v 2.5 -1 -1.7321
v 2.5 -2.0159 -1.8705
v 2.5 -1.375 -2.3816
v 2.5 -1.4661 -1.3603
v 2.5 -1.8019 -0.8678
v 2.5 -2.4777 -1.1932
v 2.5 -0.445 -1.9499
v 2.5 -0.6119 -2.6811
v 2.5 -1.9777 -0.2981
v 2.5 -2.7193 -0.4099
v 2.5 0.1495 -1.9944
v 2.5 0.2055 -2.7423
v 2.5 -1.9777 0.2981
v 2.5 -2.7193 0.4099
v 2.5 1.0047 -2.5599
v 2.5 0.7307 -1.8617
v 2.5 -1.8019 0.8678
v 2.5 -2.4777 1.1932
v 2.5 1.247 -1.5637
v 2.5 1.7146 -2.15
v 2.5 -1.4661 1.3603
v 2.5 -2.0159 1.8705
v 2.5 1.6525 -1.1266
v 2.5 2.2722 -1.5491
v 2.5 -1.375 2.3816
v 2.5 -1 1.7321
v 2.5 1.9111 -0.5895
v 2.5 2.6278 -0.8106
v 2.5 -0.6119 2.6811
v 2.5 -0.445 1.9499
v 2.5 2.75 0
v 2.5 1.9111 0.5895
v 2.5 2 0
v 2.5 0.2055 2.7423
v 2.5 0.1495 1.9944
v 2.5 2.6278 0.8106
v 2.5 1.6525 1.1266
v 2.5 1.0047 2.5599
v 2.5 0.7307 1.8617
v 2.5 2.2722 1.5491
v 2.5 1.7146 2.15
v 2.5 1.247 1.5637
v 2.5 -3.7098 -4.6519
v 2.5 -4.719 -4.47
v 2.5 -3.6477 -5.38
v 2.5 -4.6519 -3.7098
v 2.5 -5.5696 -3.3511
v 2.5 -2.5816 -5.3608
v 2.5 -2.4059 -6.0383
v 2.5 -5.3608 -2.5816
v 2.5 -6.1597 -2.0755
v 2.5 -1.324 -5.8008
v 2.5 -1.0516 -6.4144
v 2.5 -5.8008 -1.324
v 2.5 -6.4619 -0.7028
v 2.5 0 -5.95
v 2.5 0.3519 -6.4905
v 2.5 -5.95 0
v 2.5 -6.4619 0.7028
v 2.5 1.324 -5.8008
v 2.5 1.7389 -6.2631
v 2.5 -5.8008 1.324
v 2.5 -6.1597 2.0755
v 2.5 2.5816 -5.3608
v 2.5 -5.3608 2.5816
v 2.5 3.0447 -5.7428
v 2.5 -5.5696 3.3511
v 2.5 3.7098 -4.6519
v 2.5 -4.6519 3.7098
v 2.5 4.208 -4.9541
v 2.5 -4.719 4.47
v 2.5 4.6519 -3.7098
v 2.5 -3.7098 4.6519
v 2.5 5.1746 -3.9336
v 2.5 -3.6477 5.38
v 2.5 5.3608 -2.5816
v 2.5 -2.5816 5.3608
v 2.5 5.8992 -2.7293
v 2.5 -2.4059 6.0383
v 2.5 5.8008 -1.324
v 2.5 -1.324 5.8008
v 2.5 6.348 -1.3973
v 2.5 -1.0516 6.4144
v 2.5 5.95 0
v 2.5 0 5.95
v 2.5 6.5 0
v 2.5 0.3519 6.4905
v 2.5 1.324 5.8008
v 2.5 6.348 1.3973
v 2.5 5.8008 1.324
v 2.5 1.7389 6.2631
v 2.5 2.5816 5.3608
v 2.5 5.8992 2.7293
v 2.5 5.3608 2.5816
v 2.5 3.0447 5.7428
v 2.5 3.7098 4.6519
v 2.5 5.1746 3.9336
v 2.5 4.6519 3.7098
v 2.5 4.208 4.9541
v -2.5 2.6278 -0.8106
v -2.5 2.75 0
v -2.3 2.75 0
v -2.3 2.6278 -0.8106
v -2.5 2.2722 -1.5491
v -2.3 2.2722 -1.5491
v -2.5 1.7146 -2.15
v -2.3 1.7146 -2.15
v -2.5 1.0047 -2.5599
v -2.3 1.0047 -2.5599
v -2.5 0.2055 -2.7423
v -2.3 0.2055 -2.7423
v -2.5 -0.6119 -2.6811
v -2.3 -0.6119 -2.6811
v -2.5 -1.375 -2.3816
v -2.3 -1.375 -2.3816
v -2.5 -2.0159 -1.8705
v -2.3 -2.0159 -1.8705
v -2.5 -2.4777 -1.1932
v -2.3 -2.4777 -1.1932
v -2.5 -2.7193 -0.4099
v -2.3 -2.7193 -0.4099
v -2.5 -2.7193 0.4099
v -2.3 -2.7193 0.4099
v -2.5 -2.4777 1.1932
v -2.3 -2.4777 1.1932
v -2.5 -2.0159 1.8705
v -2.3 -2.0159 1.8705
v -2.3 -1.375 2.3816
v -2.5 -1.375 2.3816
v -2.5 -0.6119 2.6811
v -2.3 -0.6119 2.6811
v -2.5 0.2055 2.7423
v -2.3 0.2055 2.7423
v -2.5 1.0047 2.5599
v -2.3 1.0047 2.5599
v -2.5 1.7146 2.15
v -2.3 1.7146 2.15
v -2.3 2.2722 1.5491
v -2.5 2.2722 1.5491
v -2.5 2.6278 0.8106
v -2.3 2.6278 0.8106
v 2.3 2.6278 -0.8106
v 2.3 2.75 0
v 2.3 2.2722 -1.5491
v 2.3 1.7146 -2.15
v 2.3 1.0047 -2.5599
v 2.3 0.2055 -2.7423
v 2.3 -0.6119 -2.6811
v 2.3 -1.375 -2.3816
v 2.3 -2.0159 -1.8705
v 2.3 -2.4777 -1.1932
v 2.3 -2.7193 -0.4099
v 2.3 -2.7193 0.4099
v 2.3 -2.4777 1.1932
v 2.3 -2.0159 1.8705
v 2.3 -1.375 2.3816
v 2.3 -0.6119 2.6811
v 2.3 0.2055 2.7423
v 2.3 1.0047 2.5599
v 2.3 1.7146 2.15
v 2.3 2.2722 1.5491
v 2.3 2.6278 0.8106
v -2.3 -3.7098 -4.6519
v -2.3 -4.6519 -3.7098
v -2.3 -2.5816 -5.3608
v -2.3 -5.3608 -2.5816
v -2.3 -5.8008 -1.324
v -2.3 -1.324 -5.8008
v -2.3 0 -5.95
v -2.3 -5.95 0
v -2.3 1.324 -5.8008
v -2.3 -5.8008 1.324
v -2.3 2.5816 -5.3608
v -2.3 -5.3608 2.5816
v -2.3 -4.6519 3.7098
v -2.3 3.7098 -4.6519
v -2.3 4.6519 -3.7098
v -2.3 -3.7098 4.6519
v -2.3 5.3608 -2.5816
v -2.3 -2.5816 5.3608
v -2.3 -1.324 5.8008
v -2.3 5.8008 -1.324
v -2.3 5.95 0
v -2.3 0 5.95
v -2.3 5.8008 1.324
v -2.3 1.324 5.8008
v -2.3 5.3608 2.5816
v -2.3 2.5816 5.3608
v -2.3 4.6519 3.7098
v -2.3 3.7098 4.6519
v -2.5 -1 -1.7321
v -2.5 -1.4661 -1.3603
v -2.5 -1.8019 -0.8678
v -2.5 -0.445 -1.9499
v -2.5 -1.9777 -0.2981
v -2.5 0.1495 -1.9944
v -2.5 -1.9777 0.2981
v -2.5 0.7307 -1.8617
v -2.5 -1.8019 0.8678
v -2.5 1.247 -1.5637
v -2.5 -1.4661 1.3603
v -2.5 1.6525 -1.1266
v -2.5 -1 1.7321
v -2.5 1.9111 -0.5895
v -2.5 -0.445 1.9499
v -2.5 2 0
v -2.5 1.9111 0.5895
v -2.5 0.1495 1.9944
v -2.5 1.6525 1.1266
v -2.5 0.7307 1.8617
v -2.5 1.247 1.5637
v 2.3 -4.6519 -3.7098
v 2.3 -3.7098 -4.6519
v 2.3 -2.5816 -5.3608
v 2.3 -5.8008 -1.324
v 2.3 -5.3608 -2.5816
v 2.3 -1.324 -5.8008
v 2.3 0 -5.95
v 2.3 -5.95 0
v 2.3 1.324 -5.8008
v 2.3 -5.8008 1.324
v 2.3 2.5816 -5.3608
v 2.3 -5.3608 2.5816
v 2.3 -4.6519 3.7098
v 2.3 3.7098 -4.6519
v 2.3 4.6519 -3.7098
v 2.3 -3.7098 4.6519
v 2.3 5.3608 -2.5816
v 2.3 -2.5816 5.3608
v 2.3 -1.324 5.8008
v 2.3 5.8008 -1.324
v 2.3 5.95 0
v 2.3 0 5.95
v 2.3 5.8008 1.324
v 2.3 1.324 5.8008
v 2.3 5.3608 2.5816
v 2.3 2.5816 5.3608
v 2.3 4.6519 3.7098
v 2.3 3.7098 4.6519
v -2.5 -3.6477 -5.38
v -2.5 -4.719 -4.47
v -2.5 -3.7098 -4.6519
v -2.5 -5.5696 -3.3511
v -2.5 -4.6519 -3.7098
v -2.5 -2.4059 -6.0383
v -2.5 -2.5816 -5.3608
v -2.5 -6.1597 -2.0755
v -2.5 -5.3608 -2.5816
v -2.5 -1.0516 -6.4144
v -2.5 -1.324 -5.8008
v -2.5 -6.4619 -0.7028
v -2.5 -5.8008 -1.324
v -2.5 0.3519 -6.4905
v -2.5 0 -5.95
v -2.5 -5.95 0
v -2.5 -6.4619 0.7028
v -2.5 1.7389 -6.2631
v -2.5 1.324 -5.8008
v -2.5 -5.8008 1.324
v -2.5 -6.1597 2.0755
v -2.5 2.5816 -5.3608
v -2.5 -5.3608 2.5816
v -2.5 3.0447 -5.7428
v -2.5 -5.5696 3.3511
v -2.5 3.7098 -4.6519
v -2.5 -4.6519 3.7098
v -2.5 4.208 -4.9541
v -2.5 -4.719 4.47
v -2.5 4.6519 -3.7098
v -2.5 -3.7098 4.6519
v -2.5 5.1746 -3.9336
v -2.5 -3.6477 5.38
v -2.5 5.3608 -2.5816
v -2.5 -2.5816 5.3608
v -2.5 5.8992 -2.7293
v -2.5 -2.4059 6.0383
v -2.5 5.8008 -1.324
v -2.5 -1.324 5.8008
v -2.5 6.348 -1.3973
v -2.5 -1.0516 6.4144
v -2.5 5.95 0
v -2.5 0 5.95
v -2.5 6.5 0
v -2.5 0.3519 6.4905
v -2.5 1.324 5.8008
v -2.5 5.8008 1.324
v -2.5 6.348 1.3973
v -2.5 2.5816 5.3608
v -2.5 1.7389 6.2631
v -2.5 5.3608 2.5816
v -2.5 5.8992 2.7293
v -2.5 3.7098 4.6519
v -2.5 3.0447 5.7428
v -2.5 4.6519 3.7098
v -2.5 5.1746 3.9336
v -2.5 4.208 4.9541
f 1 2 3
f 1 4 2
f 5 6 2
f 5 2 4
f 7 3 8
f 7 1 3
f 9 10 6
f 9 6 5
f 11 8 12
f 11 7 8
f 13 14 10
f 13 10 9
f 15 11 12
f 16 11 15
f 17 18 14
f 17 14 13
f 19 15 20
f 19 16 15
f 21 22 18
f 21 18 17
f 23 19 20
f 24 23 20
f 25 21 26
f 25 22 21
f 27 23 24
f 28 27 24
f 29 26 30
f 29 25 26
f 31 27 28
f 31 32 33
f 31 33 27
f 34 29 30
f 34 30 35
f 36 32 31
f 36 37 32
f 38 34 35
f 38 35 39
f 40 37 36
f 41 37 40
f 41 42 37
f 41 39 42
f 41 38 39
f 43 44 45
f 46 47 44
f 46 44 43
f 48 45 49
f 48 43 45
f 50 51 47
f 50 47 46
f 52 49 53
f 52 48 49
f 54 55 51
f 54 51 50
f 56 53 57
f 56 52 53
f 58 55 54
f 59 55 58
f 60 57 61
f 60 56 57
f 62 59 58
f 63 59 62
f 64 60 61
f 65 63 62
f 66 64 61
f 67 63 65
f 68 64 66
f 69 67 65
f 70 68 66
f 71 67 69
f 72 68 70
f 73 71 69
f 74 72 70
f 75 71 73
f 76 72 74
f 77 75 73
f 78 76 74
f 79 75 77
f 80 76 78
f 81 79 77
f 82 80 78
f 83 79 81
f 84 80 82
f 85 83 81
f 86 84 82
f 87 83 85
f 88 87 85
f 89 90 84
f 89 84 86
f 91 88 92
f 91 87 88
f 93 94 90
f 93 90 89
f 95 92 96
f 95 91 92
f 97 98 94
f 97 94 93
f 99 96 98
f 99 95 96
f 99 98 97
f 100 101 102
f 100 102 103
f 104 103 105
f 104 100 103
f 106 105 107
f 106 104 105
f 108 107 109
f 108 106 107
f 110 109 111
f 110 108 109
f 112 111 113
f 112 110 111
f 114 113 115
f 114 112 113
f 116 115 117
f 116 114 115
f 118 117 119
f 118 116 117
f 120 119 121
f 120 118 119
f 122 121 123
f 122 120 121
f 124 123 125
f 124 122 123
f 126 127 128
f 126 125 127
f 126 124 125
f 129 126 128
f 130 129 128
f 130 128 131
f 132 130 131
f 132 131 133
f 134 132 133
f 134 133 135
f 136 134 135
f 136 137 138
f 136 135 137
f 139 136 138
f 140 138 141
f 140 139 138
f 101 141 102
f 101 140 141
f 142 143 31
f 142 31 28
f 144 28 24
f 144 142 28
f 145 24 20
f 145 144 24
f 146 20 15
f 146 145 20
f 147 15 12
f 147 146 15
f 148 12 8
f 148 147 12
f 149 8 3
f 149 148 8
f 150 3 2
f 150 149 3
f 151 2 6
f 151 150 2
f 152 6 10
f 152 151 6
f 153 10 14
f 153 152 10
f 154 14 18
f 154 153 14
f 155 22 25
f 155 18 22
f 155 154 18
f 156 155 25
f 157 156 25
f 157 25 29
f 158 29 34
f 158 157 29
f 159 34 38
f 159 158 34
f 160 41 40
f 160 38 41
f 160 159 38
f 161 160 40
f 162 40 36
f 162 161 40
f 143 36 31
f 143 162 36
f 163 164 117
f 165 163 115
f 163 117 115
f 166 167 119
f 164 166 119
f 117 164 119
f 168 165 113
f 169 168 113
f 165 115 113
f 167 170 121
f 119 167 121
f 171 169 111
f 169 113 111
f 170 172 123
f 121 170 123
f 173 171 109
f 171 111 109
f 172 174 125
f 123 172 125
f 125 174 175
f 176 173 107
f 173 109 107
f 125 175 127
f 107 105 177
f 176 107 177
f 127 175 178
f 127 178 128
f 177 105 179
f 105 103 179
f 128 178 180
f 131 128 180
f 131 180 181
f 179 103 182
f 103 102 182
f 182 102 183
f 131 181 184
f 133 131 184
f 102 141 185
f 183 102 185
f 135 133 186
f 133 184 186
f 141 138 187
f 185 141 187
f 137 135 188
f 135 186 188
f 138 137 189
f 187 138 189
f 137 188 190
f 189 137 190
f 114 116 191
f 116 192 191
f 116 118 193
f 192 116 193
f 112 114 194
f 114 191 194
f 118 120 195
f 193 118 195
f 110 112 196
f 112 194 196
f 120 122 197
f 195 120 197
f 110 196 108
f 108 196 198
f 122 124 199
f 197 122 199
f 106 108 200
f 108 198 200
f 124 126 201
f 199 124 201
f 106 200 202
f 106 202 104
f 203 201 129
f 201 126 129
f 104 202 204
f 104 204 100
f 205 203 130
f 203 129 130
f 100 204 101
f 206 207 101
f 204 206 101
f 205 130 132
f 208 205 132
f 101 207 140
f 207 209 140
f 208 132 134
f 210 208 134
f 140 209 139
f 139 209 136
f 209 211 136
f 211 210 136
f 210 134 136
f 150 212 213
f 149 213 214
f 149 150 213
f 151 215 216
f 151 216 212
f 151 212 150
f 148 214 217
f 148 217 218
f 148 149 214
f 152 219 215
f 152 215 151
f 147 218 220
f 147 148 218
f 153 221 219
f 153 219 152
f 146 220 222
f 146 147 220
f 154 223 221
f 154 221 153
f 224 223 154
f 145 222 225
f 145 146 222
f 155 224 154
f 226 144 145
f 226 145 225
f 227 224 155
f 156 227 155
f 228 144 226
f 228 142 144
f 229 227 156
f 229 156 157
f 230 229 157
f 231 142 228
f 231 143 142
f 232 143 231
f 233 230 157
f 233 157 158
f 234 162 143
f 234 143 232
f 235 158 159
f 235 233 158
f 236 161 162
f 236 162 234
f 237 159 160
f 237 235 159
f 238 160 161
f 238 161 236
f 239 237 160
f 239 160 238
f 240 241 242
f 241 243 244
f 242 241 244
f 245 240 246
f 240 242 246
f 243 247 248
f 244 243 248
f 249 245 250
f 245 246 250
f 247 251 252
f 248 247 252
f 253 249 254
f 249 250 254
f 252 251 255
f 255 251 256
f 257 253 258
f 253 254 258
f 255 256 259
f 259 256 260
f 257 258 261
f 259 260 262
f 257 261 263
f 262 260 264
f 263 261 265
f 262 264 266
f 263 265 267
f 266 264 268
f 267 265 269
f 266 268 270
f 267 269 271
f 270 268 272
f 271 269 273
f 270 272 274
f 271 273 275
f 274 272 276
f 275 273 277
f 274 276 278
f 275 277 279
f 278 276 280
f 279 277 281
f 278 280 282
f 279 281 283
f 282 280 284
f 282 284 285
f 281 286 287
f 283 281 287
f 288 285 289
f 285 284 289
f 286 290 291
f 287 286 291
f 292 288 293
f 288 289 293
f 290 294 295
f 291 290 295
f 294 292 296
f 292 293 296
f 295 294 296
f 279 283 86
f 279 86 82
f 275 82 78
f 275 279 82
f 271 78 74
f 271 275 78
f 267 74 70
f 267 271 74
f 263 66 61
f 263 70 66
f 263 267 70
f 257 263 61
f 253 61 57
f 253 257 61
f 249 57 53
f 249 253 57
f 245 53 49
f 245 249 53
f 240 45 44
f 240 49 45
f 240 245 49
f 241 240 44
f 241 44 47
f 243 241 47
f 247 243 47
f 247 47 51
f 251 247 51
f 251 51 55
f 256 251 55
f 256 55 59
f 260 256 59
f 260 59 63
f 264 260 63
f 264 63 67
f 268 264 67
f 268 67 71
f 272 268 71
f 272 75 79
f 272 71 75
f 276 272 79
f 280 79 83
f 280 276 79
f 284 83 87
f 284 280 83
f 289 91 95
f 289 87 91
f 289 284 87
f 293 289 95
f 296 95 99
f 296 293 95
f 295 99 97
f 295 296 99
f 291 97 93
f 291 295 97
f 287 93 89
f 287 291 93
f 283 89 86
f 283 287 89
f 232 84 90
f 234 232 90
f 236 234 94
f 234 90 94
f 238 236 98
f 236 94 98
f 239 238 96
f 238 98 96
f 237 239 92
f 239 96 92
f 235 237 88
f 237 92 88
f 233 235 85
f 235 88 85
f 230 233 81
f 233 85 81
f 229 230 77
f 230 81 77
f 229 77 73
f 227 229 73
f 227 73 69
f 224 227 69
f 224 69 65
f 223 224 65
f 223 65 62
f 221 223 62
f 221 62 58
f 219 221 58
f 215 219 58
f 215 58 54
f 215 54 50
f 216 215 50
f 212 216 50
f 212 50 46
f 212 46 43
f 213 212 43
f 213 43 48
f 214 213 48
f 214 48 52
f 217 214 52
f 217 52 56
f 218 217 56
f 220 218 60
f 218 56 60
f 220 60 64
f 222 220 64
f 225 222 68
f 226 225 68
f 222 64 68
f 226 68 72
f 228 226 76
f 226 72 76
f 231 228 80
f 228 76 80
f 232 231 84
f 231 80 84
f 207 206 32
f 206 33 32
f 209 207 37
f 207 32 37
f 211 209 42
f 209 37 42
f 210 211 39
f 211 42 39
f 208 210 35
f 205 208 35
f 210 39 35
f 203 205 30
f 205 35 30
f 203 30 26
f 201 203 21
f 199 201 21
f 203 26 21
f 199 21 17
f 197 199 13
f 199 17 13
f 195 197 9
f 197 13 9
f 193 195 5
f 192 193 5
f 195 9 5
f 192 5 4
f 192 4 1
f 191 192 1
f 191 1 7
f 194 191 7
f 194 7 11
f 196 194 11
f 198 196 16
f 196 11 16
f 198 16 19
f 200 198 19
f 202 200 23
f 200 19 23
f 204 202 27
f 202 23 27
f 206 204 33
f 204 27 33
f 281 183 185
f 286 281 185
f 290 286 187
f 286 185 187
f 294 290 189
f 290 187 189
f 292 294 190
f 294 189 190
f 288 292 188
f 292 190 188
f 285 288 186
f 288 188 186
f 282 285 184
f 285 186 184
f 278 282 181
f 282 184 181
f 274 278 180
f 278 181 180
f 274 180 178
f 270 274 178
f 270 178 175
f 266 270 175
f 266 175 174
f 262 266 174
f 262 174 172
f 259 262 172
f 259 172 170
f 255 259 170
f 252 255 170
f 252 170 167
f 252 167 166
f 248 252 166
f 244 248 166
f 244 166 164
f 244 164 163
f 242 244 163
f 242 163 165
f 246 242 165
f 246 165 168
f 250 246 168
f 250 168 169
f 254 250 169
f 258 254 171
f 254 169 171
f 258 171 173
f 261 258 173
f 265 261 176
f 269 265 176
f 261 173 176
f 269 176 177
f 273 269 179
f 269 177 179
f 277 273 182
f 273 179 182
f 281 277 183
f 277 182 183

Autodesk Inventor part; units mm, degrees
ref_plane "YZ Plane" through (0, 0, 0) normal (1, 0, 0) x (0, 1, 0)
ref_plane "XZ Plane" through (0, 0, 0) normal (0, 1, 0) x (-1, 0, 0)
ref_plane "XY Plane" through (0, 0, 0) normal (0, 0, 1) x (1, 0, 0)
sketch "Sketch_1" plane through (0, 0, 0) normal (0, 0, 1) x (1, 0, 0)
  line L0 (50, 0) -> (-50, 0)
  line L1 (-2.5, 5.95) -> (-2.3, 5.95)
  line L2 (-2.3, 5.95) -> (-2.3, 2.75)
  line L3 (-2.3, 2.75) -> (-2.5, 2.75)
  line L4 (-2.5, 2.75) -> (-2.5, 2)
  line L5 (-2.5, 2) -> (2.5, 2)
  line L6 (2.5, 2) -> (2.5, 2.75)
  line L7 (2.5, 2.75) -> (2.3, 2.75)
  line L8 (2.3, 2.75) -> (2.3, 5.95)
  line L9 (2.3, 5.95) -> (2.5, 5.95)
  line L10 (2.5, 5.95) -> (2.5, 6.5)
  line L11 (2.5, 6.5) -> (-2.5, 6.5)
  line L12 (-2.5, 6.5) -> (-2.5, 5.95)
revolve "Revolution1" add sketch "Sketch_1" angle 360 about axis through (50, 0, 0) along (1, 0, 0)
properties part number "riku_mae_bis17_624-ZZ-MAE"
